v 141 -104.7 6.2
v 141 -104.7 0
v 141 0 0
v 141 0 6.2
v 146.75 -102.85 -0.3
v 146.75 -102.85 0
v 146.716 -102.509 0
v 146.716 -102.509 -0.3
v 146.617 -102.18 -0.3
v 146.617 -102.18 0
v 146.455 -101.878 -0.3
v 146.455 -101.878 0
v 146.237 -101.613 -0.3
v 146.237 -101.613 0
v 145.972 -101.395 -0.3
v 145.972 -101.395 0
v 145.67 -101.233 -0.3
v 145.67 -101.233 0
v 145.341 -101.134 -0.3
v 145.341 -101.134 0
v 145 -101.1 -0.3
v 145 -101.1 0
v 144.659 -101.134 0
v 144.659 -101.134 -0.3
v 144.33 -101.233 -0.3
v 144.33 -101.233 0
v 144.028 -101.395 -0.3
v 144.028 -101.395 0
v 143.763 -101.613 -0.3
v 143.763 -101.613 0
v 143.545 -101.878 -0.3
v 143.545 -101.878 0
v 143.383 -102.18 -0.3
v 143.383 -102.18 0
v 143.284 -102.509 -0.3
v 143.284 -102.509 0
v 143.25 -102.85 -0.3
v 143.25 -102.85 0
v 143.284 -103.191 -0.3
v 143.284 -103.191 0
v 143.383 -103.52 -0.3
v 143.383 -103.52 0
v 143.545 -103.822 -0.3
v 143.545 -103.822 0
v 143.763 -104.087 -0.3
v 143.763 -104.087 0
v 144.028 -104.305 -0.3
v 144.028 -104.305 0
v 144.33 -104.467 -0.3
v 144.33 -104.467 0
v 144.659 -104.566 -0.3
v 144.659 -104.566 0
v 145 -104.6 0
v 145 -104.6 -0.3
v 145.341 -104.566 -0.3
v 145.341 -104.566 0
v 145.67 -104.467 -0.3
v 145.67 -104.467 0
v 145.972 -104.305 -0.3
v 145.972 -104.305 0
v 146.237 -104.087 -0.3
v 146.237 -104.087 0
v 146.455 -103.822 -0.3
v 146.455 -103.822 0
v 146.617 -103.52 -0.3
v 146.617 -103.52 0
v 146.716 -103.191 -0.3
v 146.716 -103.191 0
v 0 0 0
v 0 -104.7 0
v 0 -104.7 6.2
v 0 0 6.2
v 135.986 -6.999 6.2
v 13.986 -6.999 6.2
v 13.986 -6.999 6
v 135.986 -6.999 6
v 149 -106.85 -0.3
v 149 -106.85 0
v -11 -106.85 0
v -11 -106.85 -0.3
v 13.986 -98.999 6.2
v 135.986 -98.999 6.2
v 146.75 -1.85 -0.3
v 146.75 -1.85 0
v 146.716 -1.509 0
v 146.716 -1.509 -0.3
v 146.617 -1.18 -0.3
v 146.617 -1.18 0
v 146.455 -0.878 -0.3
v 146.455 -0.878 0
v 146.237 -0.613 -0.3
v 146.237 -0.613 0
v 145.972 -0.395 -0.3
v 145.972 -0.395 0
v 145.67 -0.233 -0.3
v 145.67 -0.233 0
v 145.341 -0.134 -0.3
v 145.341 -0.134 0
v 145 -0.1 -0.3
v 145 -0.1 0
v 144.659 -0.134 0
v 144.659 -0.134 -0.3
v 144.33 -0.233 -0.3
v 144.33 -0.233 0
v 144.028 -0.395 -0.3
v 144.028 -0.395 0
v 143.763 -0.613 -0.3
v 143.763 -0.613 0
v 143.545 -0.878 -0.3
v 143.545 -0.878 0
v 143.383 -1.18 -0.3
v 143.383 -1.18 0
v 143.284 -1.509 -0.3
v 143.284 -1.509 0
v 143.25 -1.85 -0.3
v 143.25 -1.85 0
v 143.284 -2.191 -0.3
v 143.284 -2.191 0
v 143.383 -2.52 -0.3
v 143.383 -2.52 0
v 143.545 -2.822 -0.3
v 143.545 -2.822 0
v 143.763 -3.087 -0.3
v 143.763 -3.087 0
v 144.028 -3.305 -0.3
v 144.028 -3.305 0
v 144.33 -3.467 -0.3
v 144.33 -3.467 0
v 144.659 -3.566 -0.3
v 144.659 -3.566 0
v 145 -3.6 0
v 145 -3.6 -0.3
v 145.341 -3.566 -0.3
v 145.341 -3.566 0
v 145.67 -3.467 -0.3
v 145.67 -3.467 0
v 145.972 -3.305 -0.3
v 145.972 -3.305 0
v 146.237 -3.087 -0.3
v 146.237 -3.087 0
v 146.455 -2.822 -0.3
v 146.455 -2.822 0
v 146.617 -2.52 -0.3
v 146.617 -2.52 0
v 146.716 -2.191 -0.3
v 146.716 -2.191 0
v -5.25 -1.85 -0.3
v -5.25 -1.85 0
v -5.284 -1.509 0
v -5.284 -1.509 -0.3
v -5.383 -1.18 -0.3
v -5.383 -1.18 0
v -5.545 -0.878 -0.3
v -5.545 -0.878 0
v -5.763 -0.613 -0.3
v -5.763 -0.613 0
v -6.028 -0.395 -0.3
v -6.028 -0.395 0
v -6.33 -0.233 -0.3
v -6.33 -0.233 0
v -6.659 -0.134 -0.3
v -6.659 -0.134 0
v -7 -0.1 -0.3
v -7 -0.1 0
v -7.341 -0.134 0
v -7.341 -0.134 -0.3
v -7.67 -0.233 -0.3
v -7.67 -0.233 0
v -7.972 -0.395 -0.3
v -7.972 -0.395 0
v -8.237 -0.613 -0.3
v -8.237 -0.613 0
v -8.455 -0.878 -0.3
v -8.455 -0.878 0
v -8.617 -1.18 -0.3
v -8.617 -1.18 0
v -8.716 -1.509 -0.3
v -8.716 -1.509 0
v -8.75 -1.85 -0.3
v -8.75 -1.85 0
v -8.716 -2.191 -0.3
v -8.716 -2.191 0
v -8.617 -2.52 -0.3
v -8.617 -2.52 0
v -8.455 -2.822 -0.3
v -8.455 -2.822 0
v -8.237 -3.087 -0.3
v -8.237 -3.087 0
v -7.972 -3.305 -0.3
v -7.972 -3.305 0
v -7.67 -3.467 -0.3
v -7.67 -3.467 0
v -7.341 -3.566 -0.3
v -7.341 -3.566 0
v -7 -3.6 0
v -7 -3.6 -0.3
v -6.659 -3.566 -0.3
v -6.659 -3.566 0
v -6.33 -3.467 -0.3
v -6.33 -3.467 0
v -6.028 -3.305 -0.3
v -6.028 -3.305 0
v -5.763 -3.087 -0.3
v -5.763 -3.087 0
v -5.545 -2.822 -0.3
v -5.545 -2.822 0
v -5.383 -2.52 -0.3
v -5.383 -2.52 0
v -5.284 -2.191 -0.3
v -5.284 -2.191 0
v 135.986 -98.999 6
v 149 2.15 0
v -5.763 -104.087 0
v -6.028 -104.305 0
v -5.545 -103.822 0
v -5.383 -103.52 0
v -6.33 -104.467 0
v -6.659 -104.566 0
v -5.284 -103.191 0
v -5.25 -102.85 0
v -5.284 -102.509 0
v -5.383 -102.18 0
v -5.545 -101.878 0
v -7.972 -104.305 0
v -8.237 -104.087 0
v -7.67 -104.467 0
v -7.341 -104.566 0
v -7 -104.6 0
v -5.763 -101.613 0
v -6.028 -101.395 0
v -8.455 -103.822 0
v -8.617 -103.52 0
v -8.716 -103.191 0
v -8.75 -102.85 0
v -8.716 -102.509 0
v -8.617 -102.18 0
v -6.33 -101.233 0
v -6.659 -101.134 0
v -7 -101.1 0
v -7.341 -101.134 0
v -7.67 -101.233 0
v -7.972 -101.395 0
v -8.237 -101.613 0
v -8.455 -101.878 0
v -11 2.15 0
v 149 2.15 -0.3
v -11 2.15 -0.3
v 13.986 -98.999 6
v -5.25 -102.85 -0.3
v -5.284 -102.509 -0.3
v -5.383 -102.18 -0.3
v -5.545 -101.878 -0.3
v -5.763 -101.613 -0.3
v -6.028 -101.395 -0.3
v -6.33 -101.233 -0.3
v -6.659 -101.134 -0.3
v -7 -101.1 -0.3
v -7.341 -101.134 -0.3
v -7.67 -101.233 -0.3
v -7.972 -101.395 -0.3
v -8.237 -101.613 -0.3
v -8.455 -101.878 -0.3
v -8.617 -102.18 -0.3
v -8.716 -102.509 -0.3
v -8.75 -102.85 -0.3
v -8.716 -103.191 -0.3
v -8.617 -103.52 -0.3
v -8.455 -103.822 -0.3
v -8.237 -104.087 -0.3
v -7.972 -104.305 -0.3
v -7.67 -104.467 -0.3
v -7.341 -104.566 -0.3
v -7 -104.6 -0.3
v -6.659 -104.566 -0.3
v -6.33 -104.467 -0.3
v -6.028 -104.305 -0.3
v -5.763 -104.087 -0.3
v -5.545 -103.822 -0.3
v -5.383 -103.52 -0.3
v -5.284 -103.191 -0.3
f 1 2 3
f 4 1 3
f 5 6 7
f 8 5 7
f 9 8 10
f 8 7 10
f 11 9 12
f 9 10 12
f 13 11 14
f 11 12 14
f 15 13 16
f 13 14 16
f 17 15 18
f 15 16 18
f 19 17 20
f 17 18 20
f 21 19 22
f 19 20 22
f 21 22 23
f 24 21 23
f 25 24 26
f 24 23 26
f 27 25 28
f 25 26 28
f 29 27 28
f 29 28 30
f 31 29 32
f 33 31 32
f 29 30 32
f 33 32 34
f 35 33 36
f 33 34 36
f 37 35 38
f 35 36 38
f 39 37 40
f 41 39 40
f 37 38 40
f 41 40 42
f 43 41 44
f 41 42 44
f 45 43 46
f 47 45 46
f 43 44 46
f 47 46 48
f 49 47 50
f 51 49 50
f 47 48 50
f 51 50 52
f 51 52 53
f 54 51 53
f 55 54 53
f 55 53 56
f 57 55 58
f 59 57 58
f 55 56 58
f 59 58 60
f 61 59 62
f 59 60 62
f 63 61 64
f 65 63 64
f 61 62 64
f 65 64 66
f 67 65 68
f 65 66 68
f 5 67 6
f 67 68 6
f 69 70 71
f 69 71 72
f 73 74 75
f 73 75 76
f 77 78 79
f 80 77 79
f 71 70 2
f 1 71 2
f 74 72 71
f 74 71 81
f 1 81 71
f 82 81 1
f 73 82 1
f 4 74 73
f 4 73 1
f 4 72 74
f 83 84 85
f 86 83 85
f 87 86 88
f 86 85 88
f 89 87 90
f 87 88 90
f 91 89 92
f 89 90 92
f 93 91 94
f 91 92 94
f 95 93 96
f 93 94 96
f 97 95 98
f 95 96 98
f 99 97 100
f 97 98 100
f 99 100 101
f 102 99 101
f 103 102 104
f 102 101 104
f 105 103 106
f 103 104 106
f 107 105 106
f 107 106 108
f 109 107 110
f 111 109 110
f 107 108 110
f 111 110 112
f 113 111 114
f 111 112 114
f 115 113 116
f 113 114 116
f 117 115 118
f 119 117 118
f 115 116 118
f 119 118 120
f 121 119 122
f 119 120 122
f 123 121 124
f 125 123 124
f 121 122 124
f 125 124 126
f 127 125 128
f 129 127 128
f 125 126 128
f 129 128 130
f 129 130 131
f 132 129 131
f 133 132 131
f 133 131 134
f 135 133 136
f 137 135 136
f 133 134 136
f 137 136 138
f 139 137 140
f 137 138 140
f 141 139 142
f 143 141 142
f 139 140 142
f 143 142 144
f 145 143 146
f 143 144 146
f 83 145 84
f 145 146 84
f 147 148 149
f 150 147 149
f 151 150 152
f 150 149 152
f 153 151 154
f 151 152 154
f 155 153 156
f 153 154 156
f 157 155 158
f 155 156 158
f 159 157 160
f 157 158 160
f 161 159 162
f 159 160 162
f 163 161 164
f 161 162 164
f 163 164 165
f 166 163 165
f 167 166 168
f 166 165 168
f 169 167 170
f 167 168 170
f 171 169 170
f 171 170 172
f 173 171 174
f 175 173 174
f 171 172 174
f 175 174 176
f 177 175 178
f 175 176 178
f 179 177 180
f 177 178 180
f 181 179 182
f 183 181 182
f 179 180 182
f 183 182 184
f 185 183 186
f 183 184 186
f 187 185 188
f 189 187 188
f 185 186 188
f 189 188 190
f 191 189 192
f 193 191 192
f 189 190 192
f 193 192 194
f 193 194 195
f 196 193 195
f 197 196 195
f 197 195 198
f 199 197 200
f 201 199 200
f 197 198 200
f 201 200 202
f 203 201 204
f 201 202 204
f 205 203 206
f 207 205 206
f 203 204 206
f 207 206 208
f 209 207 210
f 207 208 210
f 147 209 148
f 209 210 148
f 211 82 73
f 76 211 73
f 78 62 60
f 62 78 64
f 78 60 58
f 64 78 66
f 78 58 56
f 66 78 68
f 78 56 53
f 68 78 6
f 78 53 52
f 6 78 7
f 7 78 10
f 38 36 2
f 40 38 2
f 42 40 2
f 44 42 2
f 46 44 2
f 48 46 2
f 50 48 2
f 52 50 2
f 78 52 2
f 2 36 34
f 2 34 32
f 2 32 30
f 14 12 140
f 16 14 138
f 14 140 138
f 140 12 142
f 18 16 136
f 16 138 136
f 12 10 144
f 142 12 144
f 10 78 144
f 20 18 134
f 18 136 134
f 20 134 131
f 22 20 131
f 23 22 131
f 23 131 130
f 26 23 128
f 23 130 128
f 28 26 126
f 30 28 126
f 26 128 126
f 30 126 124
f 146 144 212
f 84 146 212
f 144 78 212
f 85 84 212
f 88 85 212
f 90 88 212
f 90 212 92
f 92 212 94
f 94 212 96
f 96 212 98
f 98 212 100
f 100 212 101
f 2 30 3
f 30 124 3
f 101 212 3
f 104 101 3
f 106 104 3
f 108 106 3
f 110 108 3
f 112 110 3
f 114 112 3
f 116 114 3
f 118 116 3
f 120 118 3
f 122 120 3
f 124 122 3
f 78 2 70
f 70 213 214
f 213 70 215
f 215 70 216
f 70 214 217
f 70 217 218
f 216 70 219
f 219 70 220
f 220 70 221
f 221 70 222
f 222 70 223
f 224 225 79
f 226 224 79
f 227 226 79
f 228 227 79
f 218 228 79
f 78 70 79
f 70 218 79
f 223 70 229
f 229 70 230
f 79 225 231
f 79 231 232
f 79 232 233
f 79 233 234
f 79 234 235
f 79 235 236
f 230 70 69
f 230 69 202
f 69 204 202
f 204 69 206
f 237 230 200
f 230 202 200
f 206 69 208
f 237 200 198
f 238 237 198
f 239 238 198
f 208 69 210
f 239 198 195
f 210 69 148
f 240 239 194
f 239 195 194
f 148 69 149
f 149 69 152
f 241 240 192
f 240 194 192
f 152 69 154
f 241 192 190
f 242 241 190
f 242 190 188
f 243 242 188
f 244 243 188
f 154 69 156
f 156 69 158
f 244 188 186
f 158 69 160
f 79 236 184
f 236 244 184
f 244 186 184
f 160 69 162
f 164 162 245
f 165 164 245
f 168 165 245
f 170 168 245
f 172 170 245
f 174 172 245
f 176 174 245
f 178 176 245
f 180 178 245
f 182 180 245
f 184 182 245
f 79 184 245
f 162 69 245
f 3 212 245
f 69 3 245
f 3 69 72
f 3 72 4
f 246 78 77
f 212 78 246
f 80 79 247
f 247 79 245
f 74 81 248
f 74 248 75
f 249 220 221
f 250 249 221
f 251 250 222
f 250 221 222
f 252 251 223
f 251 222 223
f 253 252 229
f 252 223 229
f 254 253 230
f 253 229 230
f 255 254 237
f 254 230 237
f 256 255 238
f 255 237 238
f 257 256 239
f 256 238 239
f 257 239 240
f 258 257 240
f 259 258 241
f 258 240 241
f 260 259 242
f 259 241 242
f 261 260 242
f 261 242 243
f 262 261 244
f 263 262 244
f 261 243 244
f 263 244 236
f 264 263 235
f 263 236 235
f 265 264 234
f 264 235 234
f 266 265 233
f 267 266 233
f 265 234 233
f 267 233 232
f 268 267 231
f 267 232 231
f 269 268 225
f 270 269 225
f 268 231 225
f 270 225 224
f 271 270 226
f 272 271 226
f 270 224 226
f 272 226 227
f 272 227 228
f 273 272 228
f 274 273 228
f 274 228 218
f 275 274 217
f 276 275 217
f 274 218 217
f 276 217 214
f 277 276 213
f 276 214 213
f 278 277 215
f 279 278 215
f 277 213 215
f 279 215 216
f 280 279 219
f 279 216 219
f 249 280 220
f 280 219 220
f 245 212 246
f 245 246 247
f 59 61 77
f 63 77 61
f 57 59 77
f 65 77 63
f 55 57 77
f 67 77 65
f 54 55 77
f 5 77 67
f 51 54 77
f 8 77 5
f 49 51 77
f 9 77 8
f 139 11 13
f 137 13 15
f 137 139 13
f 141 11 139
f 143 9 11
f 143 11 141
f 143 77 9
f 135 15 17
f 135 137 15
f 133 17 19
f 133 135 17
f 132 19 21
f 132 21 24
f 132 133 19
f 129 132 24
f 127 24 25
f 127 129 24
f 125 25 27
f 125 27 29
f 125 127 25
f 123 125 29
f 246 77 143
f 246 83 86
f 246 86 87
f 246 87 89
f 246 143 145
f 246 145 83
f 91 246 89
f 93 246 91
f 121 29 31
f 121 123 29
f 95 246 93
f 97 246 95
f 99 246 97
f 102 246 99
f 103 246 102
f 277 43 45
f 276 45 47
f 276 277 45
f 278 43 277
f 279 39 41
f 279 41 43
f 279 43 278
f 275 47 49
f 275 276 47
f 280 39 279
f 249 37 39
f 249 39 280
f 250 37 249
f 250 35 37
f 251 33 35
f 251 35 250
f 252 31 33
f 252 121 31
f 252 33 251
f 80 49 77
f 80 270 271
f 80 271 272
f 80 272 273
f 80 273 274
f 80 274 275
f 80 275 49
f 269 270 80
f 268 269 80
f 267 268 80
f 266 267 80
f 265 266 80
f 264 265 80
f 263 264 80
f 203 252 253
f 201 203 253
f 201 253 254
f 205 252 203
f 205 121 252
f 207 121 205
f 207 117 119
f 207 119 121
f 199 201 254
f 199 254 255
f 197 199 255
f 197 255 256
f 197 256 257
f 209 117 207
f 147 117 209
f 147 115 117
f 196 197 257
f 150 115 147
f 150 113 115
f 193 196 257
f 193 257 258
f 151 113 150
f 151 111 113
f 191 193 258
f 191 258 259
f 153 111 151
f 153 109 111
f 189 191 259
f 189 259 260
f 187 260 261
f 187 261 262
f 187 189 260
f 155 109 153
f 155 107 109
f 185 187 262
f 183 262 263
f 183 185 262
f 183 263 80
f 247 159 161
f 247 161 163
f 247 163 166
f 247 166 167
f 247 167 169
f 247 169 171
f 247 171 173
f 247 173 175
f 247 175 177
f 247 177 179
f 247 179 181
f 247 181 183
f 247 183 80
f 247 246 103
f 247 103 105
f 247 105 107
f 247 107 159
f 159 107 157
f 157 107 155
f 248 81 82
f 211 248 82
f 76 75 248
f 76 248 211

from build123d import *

# Parameters (mm, degrees)
SKETCH1_W          = 141
SKETCH1_H          = 104.7
EXTRUDE1_DEPTH     = 6.2
SKETCH4_W          = 160
SKETCH4_H          = 109
EXTRUDE2_DEPTH     = 0.3
SKETCH5_R          = 1.75
CUT_EXTRUDE1_DEPTH = 0.3
SKETCH3_W          = 122
SKETCH3_H          = 92
CUT_EXTRUDE4_DEPTH = 0.2


with BuildPart() as part:
    # Sketch1 → Extrude1 (new body)
    with BuildSketch(Plane.XY):
        with Locations((70.5, -52.35)):
            Rectangle(SKETCH1_W, SKETCH1_H)
    extrude(amount=EXTRUDE1_DEPTH)

    # Sketch4 → Extrude2 (add)
    with BuildSketch(Plane(origin=(0, 0, 0), x_dir=(-1, 0, 0), z_dir=(0, 0, -1))):
        with Locations((-69, -52.35)):
            Rectangle(SKETCH4_W, SKETCH4_H)
    extrude(amount=EXTRUDE2_DEPTH)

    # Sketch5 → Cut-Extrude1 (cut)
    with BuildSketch(Plane.XY):
        with Locations((145, -1.85)):
            Circle(SKETCH5_R)
        with Locations((145, -102.85)):
            Circle(SKETCH5_R)
        with Locations((-7, -1.85)):
            Circle(SKETCH5_R)
        with Locations((-7, -102.85)):
            Circle(SKETCH5_R)
    extrude(amount=-CUT_EXTRUDE1_DEPTH, mode=Mode.SUBTRACT)

    # Sketch3 → Cut-Extrude4 (cut)
    with BuildSketch(Plane.XY.offset(6.2)):
        with Locations((74.985806668, -52.998526077)):
            Rectangle(SKETCH3_W, SKETCH3_H)
    extrude(amount=-CUT_EXTRUDE4_DEPTH, mode=Mode.SUBTRACT)


solid = part.part
